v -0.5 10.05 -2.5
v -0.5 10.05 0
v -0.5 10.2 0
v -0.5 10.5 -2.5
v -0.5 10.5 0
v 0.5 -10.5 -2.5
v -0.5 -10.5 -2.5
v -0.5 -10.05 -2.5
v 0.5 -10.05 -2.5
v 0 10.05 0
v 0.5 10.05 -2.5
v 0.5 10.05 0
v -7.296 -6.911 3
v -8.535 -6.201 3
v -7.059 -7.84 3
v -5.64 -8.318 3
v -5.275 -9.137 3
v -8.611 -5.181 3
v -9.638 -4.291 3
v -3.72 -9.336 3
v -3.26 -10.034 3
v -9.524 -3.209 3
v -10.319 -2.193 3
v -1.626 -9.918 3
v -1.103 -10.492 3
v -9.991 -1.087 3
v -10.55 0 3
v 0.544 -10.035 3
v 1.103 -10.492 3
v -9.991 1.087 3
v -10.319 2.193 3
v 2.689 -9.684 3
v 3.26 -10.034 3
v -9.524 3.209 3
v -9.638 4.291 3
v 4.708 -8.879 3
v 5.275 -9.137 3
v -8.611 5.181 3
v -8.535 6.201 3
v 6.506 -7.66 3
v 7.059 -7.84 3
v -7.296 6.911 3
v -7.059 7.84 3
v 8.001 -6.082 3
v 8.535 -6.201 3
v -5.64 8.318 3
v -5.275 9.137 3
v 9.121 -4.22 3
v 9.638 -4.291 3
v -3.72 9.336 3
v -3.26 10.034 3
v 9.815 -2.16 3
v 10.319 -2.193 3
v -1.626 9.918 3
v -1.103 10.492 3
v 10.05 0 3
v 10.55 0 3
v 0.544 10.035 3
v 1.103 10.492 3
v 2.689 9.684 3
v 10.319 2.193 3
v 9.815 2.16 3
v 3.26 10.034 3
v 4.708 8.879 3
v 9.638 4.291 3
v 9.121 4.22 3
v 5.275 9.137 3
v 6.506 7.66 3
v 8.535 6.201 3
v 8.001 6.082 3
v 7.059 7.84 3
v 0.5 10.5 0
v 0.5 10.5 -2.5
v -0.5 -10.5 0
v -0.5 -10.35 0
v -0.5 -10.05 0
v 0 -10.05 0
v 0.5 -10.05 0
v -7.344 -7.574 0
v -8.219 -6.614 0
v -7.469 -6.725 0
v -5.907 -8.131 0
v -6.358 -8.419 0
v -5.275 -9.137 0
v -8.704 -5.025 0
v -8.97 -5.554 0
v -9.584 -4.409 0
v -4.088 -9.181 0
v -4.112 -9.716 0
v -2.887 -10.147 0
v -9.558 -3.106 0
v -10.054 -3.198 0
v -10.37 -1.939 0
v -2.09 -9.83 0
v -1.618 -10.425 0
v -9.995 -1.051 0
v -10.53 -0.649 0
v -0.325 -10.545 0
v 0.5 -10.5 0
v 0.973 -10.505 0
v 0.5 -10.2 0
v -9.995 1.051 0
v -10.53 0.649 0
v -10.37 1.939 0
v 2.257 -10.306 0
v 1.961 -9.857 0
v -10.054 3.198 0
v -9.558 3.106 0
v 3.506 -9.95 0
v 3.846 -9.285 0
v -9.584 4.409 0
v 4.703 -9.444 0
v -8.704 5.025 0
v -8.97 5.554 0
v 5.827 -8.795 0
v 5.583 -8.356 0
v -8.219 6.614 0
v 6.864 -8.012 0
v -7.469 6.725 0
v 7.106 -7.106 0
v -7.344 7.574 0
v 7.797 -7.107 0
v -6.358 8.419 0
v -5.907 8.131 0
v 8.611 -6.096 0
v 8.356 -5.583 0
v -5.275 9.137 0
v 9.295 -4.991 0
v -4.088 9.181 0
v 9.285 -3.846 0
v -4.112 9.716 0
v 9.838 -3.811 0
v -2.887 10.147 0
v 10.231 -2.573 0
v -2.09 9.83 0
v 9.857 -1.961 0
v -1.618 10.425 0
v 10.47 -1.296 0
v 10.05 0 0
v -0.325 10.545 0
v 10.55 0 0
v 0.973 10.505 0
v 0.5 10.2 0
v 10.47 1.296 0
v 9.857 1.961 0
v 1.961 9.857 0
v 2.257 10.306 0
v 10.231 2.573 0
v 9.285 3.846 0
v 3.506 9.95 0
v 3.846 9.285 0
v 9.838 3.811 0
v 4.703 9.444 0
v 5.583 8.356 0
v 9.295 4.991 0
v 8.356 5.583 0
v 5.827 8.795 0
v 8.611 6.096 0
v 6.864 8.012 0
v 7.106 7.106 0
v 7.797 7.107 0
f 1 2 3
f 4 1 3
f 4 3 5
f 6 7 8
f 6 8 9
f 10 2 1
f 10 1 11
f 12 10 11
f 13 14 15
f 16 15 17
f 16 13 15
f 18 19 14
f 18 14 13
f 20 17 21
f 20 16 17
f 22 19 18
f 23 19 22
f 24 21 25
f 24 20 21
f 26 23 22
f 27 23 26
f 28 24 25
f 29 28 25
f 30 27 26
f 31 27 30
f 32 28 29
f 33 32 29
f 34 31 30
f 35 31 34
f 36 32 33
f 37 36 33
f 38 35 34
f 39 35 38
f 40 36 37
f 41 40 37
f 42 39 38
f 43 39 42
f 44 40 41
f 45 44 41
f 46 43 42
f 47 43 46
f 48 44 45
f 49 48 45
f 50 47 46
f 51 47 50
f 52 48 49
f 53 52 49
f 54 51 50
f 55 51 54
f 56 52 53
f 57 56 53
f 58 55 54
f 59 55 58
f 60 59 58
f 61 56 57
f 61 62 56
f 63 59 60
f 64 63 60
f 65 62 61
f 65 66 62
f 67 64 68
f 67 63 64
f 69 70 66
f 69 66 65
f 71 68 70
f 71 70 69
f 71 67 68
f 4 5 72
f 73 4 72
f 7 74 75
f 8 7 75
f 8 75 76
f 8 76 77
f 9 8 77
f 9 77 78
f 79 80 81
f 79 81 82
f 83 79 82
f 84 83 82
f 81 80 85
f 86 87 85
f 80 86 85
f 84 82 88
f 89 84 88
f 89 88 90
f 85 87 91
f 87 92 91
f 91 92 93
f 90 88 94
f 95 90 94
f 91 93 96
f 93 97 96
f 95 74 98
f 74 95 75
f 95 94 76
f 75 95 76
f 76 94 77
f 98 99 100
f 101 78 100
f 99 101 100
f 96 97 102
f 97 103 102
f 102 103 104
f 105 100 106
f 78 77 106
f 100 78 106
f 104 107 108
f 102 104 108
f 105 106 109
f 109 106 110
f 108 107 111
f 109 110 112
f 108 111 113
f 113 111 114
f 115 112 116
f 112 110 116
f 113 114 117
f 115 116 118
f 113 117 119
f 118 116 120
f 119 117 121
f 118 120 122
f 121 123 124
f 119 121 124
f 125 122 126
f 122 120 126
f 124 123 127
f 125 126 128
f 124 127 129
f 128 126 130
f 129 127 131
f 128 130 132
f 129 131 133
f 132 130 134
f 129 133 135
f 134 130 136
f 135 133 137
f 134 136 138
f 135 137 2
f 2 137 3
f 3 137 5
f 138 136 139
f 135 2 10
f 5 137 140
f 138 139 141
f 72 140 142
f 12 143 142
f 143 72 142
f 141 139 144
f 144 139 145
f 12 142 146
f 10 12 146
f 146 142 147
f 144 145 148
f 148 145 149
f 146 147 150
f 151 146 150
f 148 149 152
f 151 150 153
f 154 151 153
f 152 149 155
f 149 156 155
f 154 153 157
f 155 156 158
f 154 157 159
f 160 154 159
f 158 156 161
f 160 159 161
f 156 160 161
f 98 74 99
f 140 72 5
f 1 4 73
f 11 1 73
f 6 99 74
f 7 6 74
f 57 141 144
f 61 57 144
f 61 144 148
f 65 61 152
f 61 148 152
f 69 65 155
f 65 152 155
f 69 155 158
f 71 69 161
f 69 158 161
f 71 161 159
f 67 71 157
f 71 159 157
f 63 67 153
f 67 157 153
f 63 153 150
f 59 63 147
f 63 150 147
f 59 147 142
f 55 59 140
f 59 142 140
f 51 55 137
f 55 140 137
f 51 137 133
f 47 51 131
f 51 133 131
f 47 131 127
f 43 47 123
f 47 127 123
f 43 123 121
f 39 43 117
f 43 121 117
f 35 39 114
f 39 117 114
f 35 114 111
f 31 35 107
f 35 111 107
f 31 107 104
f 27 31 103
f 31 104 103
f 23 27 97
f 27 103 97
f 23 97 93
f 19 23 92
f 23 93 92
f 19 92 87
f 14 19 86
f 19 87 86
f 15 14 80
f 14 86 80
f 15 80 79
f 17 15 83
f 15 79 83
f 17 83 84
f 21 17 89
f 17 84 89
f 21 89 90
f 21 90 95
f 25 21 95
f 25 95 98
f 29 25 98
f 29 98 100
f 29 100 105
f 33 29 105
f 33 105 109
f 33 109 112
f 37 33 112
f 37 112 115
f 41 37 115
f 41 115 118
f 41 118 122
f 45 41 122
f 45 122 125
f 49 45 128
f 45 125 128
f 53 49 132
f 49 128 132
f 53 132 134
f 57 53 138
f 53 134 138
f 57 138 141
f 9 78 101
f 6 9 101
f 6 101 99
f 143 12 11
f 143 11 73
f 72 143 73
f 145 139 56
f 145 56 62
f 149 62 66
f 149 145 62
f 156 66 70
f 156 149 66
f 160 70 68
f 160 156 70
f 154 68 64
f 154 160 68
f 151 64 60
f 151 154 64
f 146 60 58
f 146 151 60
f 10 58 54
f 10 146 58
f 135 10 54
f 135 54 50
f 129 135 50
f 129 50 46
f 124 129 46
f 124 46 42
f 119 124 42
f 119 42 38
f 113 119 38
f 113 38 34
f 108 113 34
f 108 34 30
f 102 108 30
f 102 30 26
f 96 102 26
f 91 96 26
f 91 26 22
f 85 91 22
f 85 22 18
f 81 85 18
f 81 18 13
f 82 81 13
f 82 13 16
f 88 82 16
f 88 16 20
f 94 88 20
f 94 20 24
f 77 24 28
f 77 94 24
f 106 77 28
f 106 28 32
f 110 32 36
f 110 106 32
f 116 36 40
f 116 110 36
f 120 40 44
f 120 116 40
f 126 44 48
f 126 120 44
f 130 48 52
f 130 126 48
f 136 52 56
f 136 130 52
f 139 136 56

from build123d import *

# Parameters (mm, degrees)
F0_R     = 10.55
F0_R_2   = 10.05
F1_DEPTH = 3
F4_DEPTH = 2.5
F2_W     = 1
F2_H     = 0.45
F5_DEPTH = 2.5


with BuildPart() as f1:
    # F0 (on Top) → F1 (new body)
    with BuildSketch(Plane.XY):
        Circle(F0_R)
        Circle(F0_R_2, mode=Mode.SUBTRACT)
    extrude(amount=F1_DEPTH)

    # F3 (on face) → F4 (join)
    with BuildSketch(Plane(origin=(0, 0, 0), x_dir=(1, 0, 0), z_dir=(0, 0, -1))):
        Polygon((0, 10.05), (0.5, 10.05), (0.5, 10.5), (-0.5, 10.5), (-0.5, 10.05), align=None)
    extrude(amount=F4_DEPTH)

    # F2 (on Top) → F5 (join)
    with BuildSketch(Plane.XY):
        with Locations((0, 10.275)):
            Rectangle(F2_W, F2_H)
    extrude(amount=-F5_DEPTH)


solid = f1.part
